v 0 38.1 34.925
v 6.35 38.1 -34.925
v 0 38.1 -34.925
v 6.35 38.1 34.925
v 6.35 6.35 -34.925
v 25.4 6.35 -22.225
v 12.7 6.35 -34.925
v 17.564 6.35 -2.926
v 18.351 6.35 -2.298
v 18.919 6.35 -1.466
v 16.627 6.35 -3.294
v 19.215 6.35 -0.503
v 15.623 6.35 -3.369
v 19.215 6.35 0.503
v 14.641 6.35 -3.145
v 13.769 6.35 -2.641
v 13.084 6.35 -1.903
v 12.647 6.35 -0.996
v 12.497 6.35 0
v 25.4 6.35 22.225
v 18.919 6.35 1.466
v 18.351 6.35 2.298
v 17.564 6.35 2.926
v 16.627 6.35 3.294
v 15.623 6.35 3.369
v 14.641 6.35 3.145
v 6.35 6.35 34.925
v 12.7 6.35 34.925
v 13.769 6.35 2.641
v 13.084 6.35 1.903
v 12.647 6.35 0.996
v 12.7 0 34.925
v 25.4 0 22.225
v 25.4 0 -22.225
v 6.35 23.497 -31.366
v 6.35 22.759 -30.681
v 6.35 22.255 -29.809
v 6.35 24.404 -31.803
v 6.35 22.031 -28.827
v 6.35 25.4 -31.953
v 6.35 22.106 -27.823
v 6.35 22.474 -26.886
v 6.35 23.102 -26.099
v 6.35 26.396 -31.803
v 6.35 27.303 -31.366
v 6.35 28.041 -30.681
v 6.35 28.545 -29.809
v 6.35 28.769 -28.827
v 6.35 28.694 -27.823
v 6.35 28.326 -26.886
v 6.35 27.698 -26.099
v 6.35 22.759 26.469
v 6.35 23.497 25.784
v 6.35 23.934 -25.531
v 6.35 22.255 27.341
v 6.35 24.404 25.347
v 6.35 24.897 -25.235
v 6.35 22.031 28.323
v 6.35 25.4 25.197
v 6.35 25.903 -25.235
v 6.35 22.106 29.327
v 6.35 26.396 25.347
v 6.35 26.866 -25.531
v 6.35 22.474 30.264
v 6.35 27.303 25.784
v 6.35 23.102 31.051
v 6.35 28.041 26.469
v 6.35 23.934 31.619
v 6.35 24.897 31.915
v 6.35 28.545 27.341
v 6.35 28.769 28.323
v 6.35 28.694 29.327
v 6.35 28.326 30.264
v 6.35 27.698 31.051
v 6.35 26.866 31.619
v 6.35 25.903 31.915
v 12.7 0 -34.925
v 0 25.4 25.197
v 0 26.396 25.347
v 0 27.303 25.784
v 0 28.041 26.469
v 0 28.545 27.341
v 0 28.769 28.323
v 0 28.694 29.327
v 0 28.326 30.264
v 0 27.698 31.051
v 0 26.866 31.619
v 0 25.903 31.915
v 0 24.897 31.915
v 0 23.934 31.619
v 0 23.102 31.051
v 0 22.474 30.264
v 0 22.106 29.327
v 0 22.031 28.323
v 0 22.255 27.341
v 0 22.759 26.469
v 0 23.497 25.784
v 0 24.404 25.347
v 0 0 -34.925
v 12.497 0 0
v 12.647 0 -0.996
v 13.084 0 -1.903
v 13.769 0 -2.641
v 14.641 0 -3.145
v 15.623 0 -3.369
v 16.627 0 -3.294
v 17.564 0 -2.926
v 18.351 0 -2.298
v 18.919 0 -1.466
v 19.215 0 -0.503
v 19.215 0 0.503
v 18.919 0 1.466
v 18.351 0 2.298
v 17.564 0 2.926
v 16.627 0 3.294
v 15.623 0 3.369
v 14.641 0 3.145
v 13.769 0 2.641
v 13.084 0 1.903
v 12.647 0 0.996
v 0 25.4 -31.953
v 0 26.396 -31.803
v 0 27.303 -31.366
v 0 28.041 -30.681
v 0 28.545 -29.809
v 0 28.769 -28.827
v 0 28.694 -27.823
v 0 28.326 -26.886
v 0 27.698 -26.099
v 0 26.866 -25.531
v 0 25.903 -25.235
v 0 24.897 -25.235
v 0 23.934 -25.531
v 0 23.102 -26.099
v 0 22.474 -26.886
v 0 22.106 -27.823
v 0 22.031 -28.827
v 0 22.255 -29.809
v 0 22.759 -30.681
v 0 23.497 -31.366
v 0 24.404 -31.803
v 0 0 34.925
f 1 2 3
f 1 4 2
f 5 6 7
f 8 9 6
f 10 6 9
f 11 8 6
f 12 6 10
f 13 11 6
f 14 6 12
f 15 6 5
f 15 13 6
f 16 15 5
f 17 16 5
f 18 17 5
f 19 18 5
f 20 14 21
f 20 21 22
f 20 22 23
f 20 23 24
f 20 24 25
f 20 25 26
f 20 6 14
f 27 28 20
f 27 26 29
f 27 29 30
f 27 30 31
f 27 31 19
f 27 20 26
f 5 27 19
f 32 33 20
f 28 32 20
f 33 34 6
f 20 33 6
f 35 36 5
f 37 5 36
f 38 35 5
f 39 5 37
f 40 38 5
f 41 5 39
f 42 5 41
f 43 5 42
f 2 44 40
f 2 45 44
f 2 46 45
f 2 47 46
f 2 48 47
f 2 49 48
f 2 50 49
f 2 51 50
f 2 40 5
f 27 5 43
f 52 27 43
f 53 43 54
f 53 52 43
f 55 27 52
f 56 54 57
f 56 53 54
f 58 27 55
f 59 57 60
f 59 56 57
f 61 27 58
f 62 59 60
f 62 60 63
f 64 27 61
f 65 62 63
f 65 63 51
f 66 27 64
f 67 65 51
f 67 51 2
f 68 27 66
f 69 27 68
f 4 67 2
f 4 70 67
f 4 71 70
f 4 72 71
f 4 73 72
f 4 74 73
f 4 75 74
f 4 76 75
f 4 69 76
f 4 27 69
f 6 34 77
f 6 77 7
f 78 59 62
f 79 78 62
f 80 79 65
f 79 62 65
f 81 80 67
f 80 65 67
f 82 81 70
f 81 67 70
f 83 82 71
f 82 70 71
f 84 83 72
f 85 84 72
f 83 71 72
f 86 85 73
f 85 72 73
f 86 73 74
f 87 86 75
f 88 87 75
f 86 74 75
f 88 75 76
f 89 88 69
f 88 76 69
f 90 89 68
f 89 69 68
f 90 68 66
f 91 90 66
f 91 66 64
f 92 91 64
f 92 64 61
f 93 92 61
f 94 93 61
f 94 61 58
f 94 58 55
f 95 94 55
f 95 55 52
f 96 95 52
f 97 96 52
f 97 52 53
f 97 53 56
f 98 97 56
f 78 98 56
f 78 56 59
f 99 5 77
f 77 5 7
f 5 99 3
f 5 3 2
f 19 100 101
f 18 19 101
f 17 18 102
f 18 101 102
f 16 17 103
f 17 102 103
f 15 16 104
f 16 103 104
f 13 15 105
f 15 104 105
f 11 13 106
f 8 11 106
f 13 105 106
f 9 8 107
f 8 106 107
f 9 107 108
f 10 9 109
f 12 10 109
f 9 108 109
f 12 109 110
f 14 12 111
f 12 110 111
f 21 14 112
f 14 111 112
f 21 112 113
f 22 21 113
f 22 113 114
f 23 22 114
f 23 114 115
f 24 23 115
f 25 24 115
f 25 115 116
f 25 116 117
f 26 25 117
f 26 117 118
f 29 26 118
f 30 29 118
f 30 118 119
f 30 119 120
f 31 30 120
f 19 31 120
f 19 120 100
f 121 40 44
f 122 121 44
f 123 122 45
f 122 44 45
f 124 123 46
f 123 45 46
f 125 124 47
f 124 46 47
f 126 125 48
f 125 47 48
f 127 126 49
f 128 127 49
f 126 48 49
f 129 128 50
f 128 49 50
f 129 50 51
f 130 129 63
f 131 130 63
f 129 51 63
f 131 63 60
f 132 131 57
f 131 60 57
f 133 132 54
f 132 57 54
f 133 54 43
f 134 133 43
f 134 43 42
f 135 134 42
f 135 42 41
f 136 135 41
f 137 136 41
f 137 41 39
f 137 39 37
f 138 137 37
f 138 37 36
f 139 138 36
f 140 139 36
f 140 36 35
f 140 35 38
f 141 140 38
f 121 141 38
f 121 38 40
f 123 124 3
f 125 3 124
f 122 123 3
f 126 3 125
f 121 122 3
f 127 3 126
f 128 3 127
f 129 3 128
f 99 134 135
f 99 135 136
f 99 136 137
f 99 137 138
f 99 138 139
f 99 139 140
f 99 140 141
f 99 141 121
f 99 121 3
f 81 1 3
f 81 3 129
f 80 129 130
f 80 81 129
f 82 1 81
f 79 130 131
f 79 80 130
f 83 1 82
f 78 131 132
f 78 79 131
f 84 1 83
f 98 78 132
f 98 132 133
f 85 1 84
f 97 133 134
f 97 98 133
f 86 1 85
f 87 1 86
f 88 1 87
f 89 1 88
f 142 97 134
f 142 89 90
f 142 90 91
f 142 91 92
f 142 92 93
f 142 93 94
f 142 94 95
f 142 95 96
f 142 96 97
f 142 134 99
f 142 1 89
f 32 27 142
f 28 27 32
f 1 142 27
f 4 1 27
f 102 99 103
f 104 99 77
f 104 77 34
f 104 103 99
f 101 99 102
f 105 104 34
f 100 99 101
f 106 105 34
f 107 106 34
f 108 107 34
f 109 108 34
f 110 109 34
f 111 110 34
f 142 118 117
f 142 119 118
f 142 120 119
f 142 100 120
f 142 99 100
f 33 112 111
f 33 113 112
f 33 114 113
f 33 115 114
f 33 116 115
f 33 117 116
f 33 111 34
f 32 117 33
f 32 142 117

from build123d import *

# Parameters (mm, degrees)
BOSS_EXTRUDE1_DEPTH     = 34.925
F_1_4_CLEARANCE_HOLE1_D = 6.7564
F_1_4_CLEARANCE_HOLE2_D = 6.7564
CHAMFER1_SIZE           = 12.7


with BuildPart() as part:
    # Sketch1 → Boss-Extrude1 (new, symmetric)
    with BuildSketch(Plane.XY):
        Polygon((0, 38.1), (0, 0), (25.4, 0), (25.4, 6.35), (6.35, 6.35), (6.35, 38.1), align=None)
    extrude(amount=BOSS_EXTRUDE1_DEPTH, both=True)

    # 1/4 Clearance Hole1 (through all)
    with Locations(Plane.ZY):
        with Locations((-28.575, 25.4), (28.575, 25.4)):
            Hole(F_1_4_CLEARANCE_HOLE1_D / 2)

    # 1/4 Clearance Hole2 (through all)
    with Locations(Plane(origin=(0, 6.35, 0), x_dir=(1, 0, 0), z_dir=(0, 1, 0))):
        with Locations((15.875, 0)):
            Hole(F_1_4_CLEARANCE_HOLE2_D / 2)

    # Chamfer1
    chamfer1_edges = [part.edges().sort_by_distance(p)[0] for p in [
        (25.4, 3.175, 34.925),
        (25.4, 3.175, -34.925),
    ]]
    chamfer(chamfer1_edges, length=CHAMFER1_SIZE)


solid = part.part
